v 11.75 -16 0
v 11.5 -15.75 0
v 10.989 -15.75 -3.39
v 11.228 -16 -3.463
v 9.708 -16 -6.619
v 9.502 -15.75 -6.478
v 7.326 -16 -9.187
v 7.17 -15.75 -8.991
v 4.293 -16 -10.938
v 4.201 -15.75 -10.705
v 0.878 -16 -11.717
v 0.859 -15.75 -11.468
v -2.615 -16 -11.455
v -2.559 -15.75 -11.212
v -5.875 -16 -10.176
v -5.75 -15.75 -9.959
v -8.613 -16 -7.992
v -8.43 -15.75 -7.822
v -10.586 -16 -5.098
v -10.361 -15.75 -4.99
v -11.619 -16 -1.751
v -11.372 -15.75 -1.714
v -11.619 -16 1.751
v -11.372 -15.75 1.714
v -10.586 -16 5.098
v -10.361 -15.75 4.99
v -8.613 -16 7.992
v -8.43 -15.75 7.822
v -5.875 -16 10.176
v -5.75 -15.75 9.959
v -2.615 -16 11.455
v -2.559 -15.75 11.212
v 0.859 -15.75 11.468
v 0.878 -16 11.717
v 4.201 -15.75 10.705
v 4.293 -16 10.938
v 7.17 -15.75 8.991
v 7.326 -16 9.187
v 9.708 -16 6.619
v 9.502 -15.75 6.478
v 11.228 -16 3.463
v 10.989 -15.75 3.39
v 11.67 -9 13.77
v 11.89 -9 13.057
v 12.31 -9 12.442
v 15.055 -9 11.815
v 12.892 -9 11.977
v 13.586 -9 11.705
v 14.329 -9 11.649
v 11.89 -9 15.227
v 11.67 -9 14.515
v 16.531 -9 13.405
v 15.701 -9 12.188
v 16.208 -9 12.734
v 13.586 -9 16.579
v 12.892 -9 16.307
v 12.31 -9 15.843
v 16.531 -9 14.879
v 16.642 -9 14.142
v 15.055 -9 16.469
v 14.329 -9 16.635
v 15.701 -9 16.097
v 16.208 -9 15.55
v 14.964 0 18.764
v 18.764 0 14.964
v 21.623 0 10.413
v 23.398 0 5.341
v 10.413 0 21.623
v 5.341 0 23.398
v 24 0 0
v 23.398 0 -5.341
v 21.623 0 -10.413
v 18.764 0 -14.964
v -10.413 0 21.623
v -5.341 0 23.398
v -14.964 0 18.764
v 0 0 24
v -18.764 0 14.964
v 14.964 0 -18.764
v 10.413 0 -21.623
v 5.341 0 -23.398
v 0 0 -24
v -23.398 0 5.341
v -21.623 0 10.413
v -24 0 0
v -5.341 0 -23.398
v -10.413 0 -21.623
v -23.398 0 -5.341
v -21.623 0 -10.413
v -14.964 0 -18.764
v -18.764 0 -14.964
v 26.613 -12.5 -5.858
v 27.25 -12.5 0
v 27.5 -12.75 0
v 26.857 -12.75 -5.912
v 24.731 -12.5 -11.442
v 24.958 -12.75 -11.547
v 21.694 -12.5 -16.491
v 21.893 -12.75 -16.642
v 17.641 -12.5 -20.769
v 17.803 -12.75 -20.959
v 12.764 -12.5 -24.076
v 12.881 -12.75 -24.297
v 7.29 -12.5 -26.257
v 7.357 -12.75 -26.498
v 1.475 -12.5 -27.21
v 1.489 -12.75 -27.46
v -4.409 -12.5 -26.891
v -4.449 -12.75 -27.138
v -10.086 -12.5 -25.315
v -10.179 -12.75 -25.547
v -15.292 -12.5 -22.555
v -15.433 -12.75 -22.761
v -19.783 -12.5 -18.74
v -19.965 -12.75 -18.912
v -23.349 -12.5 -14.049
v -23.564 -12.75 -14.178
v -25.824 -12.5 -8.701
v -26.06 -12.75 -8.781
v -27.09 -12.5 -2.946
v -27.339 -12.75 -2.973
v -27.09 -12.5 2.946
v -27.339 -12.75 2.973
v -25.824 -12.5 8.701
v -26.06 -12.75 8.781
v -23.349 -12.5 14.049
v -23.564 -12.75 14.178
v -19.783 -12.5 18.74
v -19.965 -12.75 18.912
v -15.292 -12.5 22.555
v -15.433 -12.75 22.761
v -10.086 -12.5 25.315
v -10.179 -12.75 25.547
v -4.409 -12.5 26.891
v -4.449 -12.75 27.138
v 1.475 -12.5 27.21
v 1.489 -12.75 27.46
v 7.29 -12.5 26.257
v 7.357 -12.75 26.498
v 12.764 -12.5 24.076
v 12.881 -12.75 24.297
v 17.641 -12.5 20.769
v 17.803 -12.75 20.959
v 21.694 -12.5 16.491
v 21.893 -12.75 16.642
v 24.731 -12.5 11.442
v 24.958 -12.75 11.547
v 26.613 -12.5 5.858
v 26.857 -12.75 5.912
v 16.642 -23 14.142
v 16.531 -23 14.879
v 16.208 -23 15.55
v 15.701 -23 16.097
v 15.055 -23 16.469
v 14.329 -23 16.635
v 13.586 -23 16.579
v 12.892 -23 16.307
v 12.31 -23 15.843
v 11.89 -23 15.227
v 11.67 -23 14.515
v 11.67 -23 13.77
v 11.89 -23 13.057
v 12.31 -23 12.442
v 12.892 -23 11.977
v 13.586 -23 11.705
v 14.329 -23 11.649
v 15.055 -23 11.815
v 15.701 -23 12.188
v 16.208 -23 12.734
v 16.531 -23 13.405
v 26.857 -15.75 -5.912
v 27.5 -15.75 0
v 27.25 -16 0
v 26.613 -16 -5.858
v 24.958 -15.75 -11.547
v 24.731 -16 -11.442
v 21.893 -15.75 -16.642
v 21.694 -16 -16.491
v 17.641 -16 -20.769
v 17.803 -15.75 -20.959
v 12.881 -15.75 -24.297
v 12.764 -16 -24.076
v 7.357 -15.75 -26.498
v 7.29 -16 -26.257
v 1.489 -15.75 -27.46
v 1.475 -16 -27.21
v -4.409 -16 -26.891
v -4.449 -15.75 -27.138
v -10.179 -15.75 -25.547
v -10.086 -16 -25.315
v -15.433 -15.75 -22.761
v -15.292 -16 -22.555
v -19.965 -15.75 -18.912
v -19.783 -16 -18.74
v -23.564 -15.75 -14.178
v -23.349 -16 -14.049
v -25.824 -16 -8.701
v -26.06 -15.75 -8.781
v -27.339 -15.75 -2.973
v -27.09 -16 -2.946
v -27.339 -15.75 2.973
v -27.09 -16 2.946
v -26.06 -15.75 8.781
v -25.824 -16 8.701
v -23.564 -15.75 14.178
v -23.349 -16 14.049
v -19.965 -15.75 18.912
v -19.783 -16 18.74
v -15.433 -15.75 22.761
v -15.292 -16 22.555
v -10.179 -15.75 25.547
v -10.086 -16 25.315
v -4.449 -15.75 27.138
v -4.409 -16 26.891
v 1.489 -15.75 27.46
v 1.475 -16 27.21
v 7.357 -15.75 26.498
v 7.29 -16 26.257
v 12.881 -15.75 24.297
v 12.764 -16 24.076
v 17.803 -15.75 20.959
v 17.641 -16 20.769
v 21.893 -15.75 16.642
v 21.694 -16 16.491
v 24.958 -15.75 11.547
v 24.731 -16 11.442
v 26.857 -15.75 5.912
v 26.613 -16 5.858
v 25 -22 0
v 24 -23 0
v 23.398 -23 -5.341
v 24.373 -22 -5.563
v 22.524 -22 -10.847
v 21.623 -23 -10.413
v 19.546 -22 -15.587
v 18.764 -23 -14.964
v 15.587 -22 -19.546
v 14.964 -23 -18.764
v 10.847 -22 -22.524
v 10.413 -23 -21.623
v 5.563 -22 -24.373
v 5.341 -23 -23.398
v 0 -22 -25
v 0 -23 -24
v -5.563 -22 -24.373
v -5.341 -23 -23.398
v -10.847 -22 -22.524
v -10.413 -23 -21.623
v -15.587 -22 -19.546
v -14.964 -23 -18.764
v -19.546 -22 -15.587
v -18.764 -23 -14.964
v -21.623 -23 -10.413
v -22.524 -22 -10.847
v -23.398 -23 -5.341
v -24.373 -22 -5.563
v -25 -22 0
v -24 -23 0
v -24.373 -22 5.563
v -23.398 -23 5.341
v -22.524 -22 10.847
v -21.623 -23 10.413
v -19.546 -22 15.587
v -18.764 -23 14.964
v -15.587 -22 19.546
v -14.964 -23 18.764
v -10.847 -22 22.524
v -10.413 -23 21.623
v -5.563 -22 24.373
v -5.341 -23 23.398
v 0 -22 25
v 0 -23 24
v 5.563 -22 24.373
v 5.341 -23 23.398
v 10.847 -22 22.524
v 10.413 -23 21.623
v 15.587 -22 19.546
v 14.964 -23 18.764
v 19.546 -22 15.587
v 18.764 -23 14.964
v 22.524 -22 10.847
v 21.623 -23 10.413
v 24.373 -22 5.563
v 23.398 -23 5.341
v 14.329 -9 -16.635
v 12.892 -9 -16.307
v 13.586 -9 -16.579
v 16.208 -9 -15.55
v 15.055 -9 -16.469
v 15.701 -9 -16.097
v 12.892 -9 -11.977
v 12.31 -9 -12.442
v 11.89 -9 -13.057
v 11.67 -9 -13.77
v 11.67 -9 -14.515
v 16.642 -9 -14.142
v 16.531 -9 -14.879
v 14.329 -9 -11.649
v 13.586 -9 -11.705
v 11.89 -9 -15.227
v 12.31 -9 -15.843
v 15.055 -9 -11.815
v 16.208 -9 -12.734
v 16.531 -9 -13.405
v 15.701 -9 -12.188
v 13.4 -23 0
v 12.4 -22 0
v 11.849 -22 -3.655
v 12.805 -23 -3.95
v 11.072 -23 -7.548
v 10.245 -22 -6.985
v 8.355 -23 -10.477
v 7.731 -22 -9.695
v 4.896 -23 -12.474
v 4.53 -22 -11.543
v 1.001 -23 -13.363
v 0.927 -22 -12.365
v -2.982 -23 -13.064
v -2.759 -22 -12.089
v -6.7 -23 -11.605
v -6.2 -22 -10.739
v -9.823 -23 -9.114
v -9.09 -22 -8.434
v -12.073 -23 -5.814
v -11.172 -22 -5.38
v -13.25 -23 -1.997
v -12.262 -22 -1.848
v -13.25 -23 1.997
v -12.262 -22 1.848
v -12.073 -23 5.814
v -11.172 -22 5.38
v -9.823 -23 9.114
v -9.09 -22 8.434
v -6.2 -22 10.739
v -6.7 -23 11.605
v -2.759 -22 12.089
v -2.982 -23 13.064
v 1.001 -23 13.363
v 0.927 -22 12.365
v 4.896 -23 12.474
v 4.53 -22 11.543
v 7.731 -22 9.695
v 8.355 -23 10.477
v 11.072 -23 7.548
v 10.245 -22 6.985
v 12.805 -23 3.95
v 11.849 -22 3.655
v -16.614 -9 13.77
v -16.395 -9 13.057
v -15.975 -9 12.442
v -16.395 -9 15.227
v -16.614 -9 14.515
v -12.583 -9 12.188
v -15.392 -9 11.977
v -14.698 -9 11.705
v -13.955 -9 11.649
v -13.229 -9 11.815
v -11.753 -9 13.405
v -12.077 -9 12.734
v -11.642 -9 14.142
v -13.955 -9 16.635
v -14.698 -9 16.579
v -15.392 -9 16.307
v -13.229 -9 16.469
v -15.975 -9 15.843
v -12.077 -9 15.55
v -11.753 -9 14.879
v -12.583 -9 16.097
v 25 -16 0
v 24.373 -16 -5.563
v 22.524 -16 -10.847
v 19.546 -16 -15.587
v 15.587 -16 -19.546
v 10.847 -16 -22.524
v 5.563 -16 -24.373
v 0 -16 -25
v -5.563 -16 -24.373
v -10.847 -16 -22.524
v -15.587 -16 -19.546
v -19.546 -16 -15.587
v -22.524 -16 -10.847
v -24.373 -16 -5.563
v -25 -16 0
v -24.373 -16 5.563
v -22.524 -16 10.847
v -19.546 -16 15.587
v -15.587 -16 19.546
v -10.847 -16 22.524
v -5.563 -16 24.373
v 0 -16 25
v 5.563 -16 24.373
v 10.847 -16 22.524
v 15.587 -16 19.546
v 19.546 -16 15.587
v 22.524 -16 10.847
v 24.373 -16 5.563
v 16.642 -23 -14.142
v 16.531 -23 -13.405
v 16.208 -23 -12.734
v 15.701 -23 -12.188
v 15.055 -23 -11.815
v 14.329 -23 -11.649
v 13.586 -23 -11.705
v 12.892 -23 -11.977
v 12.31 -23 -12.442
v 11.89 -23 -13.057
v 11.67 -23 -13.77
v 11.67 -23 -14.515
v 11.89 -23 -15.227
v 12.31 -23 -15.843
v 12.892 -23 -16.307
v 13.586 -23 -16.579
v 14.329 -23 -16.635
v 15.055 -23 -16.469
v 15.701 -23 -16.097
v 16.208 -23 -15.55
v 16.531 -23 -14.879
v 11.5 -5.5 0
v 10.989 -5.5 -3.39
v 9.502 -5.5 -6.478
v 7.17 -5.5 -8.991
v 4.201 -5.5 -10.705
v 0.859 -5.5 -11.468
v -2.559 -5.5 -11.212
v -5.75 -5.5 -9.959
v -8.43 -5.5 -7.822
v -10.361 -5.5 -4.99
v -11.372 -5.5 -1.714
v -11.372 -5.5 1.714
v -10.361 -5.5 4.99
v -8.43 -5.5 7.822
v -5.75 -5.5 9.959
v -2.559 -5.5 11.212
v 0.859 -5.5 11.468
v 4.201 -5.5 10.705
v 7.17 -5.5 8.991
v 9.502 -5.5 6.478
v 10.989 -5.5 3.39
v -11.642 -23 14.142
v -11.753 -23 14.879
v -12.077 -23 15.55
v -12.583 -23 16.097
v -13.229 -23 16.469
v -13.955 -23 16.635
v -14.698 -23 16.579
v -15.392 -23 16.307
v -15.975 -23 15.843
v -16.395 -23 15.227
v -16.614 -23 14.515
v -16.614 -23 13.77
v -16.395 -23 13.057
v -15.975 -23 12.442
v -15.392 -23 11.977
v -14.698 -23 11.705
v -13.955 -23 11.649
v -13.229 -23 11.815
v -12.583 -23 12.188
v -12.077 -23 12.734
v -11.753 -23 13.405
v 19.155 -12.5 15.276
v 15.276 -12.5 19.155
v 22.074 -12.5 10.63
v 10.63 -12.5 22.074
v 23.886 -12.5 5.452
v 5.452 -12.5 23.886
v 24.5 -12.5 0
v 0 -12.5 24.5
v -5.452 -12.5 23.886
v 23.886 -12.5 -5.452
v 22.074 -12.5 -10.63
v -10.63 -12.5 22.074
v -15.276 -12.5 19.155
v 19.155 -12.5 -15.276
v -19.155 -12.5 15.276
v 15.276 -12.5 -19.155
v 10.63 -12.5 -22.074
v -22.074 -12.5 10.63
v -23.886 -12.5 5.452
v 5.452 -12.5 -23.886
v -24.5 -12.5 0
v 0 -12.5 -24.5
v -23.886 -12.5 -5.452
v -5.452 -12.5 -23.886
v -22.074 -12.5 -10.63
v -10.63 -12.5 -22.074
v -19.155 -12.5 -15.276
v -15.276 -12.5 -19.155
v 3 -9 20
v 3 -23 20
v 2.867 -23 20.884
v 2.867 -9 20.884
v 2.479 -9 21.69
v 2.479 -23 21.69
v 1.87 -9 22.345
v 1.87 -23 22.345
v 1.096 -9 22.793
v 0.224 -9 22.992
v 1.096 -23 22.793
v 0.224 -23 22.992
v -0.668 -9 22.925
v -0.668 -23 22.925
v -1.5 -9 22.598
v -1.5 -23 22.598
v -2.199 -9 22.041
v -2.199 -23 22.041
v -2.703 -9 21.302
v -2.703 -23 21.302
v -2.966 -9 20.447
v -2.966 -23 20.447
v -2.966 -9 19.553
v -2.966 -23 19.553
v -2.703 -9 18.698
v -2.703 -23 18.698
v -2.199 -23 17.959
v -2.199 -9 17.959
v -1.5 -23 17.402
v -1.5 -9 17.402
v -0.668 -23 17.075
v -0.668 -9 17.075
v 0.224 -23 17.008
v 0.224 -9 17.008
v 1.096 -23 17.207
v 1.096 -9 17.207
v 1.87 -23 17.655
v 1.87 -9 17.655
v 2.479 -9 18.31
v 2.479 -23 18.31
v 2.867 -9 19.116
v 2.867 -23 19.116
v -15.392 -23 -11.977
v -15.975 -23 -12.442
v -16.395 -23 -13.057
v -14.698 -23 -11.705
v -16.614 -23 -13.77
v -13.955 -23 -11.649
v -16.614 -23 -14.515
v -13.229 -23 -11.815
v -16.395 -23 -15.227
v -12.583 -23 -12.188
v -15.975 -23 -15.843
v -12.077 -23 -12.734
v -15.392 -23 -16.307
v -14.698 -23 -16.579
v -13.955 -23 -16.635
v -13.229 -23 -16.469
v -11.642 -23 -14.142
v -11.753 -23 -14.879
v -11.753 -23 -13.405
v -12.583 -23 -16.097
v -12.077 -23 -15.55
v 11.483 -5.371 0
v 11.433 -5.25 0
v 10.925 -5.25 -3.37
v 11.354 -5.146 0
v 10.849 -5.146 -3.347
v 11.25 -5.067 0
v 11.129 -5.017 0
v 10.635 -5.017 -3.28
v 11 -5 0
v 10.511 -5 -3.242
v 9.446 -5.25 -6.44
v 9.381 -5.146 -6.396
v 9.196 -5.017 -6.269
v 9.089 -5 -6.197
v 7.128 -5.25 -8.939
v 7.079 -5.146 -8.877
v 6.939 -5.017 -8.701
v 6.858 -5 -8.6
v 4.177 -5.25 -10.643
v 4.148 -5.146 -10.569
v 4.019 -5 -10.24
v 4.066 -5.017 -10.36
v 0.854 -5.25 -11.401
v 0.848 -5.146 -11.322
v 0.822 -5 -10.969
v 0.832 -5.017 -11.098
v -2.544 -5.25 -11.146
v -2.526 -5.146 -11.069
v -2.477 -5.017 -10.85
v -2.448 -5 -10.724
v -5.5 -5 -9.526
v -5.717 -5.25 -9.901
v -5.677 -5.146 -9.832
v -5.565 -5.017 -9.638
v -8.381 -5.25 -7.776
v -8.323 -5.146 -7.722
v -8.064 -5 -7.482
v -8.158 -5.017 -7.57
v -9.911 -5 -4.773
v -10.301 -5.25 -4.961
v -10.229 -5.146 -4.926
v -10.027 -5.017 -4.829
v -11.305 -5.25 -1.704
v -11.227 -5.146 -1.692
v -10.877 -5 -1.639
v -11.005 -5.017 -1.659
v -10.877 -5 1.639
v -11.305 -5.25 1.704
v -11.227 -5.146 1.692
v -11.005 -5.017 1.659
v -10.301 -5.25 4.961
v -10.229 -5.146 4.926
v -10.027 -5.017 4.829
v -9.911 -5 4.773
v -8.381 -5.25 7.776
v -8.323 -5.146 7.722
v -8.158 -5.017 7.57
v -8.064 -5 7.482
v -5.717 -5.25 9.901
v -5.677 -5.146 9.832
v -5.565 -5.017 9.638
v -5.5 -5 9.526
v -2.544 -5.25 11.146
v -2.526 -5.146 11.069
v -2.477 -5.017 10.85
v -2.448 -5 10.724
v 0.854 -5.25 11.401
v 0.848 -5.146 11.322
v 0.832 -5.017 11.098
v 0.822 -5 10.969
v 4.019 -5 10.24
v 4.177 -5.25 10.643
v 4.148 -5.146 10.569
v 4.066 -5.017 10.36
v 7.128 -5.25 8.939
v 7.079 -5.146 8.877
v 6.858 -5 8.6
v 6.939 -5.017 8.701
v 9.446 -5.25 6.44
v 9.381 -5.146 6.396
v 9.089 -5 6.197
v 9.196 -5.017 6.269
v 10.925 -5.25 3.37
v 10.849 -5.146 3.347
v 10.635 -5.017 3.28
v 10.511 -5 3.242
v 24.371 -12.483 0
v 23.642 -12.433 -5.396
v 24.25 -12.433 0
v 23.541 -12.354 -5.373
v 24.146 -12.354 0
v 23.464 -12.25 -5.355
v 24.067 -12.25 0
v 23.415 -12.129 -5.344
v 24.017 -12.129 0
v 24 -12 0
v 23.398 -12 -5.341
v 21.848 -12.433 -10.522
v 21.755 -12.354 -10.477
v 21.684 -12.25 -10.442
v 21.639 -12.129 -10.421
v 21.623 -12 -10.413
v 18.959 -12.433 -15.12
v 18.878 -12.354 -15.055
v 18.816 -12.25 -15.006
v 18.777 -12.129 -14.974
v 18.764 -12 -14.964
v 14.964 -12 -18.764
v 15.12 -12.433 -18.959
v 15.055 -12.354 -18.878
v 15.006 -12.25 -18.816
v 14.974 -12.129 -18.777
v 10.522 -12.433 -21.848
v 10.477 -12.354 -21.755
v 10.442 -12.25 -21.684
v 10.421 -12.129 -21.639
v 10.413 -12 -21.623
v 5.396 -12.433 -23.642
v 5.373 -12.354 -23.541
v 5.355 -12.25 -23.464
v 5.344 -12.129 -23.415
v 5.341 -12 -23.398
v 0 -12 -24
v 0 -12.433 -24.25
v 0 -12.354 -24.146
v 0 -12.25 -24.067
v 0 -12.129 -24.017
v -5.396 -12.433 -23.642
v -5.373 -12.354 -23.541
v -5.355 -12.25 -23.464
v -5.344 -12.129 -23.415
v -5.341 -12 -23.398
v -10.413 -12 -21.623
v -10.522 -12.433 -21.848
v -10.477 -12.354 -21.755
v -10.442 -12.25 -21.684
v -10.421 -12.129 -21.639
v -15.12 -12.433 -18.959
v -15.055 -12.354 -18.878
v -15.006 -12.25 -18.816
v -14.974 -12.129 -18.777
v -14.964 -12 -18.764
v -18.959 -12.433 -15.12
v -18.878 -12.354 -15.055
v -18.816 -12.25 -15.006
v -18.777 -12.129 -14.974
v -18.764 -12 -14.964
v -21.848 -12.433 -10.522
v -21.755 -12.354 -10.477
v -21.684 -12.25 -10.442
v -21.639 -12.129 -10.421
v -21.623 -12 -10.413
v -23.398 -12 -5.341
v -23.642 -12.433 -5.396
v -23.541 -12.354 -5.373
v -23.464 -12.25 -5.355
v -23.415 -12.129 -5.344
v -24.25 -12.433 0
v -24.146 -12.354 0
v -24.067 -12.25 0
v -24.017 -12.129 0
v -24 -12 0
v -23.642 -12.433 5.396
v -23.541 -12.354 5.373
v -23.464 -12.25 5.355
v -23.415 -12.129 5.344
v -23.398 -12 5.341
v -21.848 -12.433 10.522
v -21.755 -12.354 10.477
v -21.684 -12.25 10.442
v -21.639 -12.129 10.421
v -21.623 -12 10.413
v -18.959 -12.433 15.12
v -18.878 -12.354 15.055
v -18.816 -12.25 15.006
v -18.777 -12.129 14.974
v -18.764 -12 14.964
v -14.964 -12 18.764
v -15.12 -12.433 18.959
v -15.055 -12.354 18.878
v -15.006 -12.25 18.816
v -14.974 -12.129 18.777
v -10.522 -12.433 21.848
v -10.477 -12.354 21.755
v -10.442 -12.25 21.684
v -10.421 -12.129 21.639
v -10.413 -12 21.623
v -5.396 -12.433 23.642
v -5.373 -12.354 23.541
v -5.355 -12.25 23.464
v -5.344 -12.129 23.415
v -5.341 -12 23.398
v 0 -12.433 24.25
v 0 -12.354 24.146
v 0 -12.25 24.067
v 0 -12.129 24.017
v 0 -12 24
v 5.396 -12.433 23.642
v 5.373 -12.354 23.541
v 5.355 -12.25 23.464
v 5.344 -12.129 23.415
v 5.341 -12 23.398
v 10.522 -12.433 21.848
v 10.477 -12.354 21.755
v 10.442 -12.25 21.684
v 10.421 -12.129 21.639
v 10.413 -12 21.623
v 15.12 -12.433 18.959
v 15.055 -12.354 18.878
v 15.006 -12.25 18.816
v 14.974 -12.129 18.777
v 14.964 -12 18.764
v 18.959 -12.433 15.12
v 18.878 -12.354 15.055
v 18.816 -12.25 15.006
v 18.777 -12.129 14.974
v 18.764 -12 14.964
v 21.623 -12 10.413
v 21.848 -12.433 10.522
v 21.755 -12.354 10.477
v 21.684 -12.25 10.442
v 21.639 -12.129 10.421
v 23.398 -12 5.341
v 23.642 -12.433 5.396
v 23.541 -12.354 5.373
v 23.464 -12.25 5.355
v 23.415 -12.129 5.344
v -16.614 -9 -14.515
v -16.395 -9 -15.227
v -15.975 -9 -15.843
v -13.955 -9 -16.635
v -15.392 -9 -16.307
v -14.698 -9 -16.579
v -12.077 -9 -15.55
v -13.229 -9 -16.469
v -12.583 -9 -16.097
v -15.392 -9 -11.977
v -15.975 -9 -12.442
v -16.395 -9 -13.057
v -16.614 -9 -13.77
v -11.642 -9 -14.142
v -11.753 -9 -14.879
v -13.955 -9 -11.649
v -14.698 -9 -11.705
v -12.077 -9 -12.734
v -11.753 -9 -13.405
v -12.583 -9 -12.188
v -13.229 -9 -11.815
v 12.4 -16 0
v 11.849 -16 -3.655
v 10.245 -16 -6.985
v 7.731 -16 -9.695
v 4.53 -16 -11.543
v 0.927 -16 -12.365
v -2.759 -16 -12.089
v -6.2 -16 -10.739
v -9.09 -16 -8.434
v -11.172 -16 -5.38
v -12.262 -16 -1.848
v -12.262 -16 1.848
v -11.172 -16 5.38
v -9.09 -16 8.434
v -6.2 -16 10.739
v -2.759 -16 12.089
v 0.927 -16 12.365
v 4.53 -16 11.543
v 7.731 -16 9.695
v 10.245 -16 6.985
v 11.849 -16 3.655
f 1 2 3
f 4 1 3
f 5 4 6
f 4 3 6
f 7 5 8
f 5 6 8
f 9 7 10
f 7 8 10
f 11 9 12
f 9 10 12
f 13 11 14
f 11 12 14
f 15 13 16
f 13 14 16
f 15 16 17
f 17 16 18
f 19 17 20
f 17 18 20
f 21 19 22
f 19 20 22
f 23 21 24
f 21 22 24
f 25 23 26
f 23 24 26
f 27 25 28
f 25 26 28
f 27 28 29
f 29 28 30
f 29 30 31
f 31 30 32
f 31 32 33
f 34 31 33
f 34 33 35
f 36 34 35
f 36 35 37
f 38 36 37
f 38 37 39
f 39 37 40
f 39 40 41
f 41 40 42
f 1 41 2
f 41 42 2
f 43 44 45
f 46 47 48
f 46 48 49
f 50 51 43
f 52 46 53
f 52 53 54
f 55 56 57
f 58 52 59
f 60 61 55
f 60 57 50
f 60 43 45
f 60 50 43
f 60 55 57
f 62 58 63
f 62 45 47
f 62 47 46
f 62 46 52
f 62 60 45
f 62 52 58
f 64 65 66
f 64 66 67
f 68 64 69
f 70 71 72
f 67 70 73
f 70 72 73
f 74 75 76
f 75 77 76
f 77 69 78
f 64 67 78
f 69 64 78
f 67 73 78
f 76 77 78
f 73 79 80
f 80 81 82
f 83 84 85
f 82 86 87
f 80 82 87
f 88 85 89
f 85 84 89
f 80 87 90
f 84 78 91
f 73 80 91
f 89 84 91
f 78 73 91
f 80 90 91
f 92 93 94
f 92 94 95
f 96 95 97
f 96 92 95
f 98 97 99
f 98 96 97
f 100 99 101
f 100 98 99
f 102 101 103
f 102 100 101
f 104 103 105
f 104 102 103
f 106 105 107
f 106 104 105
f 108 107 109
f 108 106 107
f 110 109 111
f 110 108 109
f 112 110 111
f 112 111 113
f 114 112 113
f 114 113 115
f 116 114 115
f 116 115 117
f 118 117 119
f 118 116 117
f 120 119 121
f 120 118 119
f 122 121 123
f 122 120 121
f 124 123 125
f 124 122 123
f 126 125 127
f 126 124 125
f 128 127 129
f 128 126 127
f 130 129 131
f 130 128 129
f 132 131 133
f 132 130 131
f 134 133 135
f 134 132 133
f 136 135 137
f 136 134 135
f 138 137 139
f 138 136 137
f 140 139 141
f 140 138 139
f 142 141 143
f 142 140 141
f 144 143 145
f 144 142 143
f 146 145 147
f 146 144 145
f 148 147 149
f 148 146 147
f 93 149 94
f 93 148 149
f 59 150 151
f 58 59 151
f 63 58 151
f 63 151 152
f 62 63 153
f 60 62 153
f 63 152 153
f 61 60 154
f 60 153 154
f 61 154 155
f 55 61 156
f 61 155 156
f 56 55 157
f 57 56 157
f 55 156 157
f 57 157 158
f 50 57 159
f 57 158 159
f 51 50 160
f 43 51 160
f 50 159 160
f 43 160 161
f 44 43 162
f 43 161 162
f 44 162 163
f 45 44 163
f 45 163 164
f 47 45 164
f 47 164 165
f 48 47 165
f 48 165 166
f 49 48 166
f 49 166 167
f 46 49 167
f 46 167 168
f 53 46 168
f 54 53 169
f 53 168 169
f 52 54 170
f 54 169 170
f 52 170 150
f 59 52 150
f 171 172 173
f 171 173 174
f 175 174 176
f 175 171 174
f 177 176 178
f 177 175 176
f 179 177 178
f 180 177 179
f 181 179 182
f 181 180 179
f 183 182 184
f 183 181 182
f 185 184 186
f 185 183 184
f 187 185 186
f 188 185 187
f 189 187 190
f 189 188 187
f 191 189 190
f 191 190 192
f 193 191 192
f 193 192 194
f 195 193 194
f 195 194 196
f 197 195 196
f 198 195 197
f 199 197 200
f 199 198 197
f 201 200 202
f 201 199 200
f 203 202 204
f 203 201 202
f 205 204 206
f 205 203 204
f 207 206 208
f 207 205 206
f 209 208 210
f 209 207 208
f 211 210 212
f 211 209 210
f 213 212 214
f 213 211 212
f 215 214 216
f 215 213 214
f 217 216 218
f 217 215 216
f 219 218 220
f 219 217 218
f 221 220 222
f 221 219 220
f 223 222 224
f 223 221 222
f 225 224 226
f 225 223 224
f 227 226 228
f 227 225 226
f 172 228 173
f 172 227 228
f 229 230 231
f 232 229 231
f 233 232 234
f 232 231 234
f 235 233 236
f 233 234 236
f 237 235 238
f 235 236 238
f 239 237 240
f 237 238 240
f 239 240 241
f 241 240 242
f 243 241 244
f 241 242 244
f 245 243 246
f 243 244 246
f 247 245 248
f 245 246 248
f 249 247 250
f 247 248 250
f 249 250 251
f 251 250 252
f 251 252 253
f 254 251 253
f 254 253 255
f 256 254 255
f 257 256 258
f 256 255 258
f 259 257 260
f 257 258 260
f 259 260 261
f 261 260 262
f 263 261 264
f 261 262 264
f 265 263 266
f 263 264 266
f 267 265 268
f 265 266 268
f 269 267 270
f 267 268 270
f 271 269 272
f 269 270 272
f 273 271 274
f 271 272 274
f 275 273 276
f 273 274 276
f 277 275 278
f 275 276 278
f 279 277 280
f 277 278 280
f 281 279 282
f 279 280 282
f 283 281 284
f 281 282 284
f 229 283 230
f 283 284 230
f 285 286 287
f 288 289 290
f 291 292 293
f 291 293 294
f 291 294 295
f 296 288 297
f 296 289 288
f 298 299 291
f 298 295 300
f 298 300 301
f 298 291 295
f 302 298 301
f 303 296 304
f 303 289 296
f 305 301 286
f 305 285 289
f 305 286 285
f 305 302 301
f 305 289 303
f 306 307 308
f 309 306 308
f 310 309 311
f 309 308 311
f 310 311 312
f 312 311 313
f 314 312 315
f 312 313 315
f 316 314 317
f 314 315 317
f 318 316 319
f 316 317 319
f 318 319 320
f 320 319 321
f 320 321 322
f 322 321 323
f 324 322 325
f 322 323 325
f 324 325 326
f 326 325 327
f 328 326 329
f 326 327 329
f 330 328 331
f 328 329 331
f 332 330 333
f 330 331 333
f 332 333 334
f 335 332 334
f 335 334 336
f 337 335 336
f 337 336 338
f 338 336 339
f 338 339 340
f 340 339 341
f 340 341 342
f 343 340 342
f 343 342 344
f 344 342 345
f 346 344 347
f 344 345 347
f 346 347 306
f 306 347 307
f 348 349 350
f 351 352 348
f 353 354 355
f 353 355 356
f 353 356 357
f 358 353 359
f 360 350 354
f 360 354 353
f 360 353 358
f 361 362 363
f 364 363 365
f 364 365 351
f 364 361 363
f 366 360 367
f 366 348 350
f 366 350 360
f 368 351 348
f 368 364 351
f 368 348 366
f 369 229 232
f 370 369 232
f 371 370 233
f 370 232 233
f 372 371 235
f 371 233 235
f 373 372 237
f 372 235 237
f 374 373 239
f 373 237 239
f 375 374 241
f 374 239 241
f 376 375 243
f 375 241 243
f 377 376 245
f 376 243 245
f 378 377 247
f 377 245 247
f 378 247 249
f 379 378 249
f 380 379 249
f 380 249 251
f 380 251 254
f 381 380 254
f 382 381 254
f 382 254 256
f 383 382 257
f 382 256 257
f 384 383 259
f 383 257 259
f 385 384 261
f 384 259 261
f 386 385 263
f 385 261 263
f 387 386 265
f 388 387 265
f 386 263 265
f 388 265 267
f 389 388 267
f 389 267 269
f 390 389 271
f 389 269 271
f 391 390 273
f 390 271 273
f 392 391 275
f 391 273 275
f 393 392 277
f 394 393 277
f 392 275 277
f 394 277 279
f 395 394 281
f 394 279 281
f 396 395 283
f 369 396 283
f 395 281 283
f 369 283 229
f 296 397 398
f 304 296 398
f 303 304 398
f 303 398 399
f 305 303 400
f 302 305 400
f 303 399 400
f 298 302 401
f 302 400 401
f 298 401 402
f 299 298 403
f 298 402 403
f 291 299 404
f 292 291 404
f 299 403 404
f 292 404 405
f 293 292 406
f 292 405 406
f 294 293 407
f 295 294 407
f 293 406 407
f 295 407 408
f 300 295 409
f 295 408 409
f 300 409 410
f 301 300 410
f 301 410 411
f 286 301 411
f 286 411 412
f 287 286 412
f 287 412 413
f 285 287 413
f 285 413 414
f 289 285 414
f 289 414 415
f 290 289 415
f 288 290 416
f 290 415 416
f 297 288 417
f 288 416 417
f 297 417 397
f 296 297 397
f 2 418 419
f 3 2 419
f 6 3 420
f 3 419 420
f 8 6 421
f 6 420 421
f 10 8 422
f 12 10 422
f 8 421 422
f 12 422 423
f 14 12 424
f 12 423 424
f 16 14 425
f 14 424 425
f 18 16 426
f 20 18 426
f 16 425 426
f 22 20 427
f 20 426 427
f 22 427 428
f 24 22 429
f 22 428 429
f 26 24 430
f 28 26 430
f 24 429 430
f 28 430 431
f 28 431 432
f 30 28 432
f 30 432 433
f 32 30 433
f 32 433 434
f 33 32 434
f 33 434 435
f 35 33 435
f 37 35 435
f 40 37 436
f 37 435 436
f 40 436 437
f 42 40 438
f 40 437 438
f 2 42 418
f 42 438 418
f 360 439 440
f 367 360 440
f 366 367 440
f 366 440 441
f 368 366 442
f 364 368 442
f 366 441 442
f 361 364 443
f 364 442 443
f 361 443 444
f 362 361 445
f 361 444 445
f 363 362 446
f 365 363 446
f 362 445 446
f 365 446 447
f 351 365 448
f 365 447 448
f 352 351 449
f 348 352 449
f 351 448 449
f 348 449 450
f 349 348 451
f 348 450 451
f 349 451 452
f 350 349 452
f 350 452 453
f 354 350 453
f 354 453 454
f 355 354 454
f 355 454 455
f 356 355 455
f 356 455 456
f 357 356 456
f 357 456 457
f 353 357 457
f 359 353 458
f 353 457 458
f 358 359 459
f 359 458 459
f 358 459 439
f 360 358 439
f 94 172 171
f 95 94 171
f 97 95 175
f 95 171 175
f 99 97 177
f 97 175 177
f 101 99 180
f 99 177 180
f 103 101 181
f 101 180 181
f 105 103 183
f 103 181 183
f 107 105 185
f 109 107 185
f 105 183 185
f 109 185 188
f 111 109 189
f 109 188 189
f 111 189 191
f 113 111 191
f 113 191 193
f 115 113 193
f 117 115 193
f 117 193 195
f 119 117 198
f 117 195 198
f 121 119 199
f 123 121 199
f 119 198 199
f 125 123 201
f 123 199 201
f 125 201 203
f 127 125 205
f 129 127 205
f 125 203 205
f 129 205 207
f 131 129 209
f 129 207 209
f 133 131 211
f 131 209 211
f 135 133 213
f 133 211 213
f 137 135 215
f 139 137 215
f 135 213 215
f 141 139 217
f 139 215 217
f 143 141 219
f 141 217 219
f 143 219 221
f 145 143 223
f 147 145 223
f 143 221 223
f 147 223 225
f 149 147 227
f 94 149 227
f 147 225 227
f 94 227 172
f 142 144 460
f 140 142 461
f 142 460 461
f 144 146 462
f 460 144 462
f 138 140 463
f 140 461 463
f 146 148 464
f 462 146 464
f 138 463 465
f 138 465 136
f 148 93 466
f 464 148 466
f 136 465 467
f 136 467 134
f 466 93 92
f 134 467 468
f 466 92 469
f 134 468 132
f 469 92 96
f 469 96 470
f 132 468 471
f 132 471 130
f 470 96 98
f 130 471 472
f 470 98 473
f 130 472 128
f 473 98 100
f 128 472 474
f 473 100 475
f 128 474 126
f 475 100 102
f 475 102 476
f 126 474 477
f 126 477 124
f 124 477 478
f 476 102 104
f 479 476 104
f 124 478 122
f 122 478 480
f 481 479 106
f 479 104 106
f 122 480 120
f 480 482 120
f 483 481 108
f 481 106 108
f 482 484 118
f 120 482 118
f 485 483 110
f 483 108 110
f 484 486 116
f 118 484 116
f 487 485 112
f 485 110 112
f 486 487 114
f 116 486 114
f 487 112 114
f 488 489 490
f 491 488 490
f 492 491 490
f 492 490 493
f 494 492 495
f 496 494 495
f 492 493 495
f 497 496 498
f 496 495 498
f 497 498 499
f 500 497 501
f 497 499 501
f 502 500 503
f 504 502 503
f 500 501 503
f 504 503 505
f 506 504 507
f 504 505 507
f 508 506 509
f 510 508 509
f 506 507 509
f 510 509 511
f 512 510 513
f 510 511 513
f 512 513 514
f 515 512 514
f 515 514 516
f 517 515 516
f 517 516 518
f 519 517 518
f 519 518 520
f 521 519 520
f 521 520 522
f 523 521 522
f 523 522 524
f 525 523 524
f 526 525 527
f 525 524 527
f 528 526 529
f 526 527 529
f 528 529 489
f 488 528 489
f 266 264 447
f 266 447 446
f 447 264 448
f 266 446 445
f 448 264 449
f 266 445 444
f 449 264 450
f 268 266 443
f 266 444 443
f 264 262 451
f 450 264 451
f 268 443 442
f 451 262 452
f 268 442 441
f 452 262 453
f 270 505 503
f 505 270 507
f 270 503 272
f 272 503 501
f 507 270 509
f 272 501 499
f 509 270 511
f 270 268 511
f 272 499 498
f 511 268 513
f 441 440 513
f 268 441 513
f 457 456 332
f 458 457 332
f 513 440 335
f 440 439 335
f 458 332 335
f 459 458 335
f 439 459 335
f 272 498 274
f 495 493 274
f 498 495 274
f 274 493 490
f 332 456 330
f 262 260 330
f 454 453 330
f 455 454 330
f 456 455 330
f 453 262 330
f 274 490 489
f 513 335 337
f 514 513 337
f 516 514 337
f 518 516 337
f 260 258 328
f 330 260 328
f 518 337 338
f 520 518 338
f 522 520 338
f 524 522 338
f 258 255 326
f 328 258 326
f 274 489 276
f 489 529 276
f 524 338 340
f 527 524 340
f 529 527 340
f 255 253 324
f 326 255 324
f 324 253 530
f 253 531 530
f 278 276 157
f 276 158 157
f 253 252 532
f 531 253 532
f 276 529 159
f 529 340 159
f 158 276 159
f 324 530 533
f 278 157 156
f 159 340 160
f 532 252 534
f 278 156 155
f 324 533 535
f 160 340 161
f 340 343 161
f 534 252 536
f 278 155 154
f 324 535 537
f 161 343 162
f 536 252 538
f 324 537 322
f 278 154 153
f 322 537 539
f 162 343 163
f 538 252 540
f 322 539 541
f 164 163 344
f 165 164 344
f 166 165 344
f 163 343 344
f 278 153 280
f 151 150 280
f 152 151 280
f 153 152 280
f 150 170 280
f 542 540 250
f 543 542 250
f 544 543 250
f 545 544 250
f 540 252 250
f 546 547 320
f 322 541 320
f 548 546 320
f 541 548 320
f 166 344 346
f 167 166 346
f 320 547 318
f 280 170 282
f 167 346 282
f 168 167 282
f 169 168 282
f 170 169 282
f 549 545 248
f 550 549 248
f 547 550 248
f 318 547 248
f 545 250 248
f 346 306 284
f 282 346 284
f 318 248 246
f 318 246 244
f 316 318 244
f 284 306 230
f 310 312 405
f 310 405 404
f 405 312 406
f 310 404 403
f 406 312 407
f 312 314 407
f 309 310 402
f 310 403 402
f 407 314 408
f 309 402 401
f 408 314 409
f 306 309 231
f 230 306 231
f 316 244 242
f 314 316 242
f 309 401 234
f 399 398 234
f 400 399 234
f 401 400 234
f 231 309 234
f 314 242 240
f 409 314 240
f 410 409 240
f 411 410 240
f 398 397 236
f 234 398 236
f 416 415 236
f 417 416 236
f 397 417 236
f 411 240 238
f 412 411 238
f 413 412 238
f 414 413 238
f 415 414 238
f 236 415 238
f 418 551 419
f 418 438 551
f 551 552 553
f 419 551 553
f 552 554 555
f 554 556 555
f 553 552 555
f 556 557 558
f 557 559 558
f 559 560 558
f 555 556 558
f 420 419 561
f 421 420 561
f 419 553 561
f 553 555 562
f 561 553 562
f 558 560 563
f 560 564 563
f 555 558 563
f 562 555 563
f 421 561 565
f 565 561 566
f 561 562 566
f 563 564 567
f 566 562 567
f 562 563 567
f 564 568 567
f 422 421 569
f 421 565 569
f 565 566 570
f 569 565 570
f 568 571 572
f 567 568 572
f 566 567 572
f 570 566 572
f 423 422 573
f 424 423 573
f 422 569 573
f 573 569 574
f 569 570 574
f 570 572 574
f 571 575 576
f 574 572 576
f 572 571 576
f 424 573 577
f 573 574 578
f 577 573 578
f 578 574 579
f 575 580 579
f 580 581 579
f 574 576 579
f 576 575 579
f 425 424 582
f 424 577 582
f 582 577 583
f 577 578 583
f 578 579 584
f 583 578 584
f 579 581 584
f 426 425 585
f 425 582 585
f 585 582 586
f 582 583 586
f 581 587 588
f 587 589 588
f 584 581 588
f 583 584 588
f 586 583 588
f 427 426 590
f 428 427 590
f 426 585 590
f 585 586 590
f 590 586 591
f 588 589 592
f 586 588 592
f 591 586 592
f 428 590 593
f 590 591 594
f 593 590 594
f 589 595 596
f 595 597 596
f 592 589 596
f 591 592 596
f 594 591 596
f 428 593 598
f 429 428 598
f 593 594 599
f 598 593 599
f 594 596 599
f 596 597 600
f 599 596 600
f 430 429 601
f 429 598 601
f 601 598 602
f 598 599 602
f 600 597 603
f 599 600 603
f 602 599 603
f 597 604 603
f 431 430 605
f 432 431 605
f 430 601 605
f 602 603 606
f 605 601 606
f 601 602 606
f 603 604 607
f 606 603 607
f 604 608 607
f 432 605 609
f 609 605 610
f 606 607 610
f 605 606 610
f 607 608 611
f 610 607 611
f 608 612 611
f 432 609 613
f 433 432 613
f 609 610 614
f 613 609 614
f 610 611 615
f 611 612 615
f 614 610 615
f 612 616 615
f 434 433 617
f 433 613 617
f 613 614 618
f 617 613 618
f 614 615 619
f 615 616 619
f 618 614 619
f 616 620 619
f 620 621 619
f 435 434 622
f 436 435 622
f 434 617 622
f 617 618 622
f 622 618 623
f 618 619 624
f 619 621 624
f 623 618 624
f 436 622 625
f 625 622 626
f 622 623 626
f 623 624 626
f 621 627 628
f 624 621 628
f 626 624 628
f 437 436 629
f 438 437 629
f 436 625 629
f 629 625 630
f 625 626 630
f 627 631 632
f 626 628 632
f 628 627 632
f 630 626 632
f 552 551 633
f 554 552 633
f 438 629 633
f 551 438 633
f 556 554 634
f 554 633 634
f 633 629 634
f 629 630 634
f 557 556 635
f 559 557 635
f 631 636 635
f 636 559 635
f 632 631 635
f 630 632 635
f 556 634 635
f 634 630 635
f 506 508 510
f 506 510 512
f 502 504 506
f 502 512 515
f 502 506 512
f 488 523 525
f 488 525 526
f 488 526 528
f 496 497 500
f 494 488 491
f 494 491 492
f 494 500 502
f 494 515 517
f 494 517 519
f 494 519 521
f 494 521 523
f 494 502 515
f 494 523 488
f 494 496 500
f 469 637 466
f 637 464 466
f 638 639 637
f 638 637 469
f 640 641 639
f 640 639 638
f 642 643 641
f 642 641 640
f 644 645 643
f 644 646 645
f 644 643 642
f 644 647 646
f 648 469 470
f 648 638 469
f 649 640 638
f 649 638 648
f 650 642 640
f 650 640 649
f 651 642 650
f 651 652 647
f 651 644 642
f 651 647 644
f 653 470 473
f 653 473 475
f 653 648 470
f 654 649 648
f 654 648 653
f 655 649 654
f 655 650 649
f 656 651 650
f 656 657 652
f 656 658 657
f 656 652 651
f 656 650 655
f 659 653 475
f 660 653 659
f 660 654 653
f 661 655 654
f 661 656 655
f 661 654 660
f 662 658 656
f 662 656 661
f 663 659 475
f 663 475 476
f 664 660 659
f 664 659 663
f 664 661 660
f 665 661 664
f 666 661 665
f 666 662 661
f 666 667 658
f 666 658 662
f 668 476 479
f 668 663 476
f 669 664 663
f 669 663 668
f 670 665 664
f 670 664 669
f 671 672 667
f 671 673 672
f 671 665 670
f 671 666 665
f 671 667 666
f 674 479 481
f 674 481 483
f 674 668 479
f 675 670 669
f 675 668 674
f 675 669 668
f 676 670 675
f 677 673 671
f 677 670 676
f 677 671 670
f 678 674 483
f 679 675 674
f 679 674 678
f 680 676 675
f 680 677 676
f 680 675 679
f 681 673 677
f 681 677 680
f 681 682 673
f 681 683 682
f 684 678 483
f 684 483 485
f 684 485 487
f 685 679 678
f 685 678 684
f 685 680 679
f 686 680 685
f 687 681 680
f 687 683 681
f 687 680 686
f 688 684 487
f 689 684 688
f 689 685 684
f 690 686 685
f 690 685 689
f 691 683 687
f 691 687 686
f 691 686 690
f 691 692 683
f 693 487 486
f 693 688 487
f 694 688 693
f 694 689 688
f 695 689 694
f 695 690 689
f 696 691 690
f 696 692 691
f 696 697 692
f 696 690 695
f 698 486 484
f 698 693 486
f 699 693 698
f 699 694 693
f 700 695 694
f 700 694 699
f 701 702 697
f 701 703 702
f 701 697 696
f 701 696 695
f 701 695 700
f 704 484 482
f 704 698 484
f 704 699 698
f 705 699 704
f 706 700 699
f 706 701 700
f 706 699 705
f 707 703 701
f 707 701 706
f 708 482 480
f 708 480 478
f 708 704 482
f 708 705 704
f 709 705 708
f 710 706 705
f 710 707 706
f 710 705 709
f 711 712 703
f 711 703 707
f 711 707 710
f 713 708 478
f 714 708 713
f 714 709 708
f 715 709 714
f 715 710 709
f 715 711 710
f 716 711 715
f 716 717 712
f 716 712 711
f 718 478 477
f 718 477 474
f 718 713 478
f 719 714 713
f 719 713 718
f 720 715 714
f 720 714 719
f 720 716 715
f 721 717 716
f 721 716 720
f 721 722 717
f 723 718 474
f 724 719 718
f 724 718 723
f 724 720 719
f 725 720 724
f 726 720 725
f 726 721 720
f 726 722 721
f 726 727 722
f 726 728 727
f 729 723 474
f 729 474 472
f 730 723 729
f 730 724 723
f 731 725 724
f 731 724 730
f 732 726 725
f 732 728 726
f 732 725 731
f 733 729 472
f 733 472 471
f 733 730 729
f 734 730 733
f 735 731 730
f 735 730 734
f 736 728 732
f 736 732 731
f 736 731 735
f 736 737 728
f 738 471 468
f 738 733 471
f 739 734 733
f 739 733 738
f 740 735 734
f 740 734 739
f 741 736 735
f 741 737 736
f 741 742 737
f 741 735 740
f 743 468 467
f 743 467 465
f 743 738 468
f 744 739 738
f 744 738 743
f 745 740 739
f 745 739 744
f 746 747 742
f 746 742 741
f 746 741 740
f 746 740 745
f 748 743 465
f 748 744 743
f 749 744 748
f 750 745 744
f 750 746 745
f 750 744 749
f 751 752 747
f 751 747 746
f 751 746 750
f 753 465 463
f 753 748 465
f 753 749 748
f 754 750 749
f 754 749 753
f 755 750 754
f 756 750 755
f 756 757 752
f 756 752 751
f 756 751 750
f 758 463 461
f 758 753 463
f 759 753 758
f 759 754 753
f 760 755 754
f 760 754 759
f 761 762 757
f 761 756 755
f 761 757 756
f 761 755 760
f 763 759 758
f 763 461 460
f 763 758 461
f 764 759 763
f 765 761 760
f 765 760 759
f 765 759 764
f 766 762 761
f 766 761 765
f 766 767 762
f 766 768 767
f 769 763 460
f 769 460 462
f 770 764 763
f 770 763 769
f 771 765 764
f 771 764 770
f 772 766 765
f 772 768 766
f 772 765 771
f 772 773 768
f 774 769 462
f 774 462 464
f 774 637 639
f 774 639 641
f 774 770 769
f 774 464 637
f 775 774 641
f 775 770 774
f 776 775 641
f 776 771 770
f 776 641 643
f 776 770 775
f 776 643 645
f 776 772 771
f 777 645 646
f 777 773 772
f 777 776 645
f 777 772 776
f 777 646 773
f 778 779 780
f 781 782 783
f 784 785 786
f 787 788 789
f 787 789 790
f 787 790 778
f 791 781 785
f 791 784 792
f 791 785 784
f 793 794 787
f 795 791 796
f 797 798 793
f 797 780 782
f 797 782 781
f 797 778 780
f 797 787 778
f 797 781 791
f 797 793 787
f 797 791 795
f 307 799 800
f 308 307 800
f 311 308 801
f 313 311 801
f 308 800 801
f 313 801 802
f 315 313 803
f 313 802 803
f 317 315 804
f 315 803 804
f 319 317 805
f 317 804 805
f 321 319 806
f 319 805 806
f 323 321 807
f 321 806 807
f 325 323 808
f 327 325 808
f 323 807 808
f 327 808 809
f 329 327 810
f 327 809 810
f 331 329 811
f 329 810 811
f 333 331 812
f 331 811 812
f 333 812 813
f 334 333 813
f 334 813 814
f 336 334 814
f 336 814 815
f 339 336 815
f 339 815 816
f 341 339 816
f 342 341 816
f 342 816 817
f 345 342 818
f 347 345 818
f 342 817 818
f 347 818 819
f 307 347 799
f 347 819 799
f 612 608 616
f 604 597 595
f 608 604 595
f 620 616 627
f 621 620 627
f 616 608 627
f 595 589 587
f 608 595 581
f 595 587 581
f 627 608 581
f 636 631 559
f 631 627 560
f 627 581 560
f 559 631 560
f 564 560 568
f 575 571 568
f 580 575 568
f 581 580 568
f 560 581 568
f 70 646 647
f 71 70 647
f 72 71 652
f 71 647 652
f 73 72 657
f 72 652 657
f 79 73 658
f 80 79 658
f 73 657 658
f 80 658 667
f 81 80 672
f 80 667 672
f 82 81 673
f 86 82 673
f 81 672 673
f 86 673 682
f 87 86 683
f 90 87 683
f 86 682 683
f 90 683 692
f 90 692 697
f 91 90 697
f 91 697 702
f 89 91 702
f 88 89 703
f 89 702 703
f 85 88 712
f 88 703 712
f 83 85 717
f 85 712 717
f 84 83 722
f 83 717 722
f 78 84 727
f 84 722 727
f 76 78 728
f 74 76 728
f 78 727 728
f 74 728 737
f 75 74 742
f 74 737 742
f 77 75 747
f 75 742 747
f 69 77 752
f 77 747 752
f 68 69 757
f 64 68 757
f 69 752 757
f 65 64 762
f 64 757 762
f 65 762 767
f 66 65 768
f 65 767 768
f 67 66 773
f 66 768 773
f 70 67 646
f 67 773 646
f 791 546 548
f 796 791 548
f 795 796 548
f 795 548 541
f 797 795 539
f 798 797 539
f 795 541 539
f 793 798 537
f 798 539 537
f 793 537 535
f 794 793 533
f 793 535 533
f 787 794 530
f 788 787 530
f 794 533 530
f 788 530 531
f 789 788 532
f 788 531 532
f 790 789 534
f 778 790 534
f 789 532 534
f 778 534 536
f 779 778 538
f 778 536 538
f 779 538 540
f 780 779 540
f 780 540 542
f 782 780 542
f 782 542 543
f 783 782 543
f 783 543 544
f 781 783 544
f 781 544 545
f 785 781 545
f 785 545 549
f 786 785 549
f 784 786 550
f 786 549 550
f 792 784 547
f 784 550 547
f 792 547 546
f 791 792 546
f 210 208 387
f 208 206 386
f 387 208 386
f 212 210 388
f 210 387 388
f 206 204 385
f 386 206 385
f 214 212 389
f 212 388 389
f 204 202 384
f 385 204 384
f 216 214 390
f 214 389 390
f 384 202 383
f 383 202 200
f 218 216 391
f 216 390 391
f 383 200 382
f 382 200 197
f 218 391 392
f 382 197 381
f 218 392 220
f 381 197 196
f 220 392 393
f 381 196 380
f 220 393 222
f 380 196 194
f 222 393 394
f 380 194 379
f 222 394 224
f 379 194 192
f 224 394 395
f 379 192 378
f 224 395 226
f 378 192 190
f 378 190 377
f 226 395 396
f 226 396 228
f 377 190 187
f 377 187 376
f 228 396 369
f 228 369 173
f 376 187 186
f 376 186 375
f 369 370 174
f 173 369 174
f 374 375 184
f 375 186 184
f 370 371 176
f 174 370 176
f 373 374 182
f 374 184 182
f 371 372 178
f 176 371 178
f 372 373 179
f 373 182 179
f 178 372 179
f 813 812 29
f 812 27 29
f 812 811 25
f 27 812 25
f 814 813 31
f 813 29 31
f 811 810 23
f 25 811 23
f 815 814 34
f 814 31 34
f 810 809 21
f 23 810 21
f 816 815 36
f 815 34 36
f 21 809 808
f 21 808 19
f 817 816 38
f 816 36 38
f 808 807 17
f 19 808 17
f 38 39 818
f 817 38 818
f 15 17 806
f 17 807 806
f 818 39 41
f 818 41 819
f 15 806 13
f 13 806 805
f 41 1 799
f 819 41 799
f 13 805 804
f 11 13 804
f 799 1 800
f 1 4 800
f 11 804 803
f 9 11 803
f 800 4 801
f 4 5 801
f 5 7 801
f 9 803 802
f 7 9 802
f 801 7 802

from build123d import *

# Parameters (mm, degrees)
CHAMFER1_SIZE      = 1
CHAMFER2_SIZE      = 0.25
FILLET1_R          = 0.5
SKETCH2_R          = 2.5
SKETCH2_R_2        = 3
CUT_EXTRUDE1_DEPTH = 14


with BuildPart() as part:
    # Sketch1 → Revolve1 (revolve)
    with BuildSketch(Plane.XY):
        Polygon((27.5, -12.5), (27.5, -16), (25, -16), (25, -23), (12.4, -23), (12.4, -16), (11.5, -16), (11.5, -5), (0, -5), (0, 0), (24, 0), (24, -12.5), align=None)
    revolve(axis=Axis((0, -394.340972919, 0), (0, 1, 0)))

    # Chamfer1
    chamfer1_edges = [part.edges().sort_by_distance(p)[0] for p in [
        (-12.4, -23, 0),
        (-25, -23, 0),
    ]]
    chamfer(chamfer1_edges, length=CHAMFER1_SIZE)

    # Chamfer2
    chamfer2_edges = [part.edges().sort_by_distance(p)[0] for p in [
        (-11.5, -16, 0),
        (-27.5, -12.5, 0),
        (-27.5, -16, 0),
    ]]
    chamfer(chamfer2_edges, length=CHAMFER2_SIZE)

    # Fillet1
    fillet1_edges = [part.edges().sort_by_distance(p)[0] for p in [
        (-11.5, -5, 0),
        (-24, -12.5, 0),
    ]]
    fillet(fillet1_edges, radius=FILLET1_R)

    # Sketch2 → Cut-Extrude1 (cut)
    with BuildSketch(Plane.XZ.offset(23)):
        with Locations((14.142135624, 14.142135624)):
            Circle(SKETCH2_R)
        with Locations((-14.142135624, 14.142135624)):
            Circle(SKETCH2_R)
        with Locations((14.142135624, -14.142135624)):
            Circle(SKETCH2_R)
        with Locations((-14.142135624, -14.142135624)):
            Circle(SKETCH2_R)
        with Locations((0, 20)):
            Circle(SKETCH2_R_2)
    extrude(amount=-CUT_EXTRUDE1_DEPTH, mode=Mode.SUBTRACT)


solid = part.part
